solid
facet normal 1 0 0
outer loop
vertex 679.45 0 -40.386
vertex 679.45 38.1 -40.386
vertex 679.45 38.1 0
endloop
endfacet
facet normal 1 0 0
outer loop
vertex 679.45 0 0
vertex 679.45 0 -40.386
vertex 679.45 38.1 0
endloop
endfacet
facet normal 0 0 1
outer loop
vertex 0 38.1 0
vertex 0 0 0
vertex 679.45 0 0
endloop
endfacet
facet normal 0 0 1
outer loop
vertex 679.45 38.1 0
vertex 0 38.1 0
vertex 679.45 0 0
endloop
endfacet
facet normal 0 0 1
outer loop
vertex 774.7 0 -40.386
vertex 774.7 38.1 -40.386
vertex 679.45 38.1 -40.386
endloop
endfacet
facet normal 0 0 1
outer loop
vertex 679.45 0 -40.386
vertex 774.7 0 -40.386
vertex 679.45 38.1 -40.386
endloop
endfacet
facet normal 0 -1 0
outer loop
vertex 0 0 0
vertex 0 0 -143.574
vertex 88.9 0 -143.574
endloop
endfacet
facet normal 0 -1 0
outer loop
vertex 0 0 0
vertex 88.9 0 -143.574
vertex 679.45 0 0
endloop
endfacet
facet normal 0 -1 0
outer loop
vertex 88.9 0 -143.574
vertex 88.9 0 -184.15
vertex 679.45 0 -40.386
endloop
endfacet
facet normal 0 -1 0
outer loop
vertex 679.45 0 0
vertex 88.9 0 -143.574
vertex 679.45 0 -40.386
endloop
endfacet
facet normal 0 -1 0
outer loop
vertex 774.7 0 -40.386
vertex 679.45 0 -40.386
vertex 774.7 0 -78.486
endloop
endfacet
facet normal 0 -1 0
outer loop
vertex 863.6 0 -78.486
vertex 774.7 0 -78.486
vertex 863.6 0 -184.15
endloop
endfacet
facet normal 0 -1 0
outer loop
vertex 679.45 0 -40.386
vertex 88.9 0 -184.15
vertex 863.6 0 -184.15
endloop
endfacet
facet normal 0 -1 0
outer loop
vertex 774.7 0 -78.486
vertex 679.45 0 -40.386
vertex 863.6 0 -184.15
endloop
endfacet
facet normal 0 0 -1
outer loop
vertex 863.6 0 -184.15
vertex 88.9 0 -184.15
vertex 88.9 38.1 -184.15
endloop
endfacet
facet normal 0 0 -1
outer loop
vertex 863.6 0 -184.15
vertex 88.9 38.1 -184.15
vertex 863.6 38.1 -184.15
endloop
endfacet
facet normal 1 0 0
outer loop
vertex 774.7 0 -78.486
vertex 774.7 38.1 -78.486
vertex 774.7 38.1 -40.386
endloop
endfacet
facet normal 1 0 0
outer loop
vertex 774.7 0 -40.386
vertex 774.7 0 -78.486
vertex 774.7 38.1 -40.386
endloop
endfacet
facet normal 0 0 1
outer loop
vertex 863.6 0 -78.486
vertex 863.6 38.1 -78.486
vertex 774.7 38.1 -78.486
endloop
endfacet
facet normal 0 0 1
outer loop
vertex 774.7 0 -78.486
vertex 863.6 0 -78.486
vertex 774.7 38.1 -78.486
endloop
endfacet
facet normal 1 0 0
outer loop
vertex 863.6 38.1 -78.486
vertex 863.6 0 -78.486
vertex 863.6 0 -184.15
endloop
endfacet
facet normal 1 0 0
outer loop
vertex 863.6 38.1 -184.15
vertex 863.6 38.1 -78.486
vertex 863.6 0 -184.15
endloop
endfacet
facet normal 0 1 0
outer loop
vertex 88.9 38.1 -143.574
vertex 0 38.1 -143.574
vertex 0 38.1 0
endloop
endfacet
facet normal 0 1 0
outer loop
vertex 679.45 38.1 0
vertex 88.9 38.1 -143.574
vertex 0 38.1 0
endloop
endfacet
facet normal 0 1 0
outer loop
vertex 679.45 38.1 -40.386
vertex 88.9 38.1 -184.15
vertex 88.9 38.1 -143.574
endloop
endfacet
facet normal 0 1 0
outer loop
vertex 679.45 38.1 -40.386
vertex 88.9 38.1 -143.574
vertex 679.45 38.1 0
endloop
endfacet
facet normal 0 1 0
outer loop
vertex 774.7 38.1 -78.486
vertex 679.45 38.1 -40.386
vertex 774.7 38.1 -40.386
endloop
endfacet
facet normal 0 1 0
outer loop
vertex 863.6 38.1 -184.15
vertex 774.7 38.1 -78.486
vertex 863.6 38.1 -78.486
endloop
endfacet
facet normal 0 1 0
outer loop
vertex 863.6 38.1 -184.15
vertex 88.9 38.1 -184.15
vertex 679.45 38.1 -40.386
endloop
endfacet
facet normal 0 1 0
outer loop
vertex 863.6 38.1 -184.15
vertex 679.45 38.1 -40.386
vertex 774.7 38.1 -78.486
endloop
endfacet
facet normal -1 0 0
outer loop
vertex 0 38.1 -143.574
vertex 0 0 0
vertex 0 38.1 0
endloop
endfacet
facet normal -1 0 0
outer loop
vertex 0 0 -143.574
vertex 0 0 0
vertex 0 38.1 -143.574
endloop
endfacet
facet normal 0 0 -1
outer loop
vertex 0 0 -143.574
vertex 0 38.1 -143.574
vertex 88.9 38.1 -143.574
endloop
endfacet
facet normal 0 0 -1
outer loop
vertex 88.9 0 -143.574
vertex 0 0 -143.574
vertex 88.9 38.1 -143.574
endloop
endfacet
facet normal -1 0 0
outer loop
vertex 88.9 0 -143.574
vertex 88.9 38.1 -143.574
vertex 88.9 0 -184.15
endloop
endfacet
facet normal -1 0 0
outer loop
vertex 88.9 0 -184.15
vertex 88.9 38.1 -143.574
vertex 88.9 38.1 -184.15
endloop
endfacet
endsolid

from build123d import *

# Parameters (mm, degrees)
SKETCH1_W           = 863.6
SKETCH1_H           = 184.15
BOSS_EXTRUDE1_DEPTH = 38.1
SKETCH3_W           = 88.9
SKETCH3_H           = 40.5765
CUT_EXTRUDE1_DEPTH  = 39.1


with BuildPart() as part:
    # Sketch1 → Boss-Extrude1 (new body)
    with BuildSketch(Plane(origin=(0, 0, 0), x_dir=(1, 0, 0), z_dir=(0, 1, 0))):
        with Locations((431.8, 92.075)):
            Rectangle(SKETCH1_W, SKETCH1_H)
    extrude(amount=BOSS_EXTRUDE1_DEPTH)

    # Sketch3 → Cut-Extrude1 (cut, through all)
    with BuildSketch(Plane(origin=(0, 38.1, 0), x_dir=(1, 0, 0), z_dir=(0, 1, 0))):
        with Locations((44.45, 163.86175)):
            Rectangle(SKETCH3_W, SKETCH3_H)
        Polygon((863.6, 78.486), (774.7, 78.486), (774.7, 40.386), (679.45, 40.386), (679.45, 0), (863.6, 0), align=None)
    extrude(amount=-CUT_EXTRUDE1_DEPTH, mode=Mode.SUBTRACT)


solid = part.part
